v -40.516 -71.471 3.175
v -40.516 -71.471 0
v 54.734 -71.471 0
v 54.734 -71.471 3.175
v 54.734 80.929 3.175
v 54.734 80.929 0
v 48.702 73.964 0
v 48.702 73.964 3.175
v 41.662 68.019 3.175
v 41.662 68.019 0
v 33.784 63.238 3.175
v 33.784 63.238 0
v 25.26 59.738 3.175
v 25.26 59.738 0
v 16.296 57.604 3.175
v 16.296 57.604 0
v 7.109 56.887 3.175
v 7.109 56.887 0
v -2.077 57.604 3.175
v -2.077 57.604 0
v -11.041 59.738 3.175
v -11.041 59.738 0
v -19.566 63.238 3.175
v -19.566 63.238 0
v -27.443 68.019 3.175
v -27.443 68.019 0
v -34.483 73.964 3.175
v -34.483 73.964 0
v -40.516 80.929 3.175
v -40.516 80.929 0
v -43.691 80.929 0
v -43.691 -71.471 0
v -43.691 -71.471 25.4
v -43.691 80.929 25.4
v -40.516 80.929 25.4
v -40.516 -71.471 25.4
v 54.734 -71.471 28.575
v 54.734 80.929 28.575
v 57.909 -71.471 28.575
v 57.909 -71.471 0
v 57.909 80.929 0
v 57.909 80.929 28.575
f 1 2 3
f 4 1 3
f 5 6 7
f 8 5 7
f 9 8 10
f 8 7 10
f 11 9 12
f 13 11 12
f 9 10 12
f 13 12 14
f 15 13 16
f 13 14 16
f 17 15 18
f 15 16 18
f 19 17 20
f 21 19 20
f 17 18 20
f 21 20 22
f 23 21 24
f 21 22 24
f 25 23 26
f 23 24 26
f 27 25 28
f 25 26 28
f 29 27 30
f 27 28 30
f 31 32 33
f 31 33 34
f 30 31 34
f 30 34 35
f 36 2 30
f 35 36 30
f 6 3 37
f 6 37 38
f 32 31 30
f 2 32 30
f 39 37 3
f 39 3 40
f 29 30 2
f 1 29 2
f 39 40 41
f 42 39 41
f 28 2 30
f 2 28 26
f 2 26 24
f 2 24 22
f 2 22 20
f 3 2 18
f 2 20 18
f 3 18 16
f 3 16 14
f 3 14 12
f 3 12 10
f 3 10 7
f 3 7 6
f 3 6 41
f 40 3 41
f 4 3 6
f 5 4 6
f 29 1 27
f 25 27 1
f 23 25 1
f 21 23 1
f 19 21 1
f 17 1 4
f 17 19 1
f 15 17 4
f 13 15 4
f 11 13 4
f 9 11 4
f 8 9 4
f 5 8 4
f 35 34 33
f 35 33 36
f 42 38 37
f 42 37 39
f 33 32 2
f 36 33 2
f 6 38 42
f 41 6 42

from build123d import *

# Parameters (mm, degrees)
F1_DEPTH = 3.175
F2_W     = 3.175
F2_H     = 152.4
F3_DEPTH = 28.575
F4_DEPTH = 25.4


with BuildPart() as f1:
    # F0 (on Top) → F1 (new body)
    with BuildSketch(Plane.XY):
        with BuildLine():
            Line((-40.515711, -68.295603), (-40.515711, -71.470603))
            Line((-40.515711, -71.470603), (54.734289, -71.470603))
            Line((54.734289, -71.470603), (54.734289, -63.526561))
            Line((54.734289, -63.526561), (54.734289, 80.929397))
            ThreePointArc((54.734289, 80.929397), (7.109289, 56.886774), (-40.515711, 80.929397))
            Line((-40.515711, 80.929397), (-40.515711, -68.295603))
        make_face()
    extrude(amount=F1_DEPTH)


with BuildPart() as f3:
    # F2 (on Top) → F3 (new body)
    with BuildSketch(Plane.XY):
        with Locations((56.321752, 4.729441)):
            Rectangle(F2_W, F2_H)
    extrude(amount=F3_DEPTH)


with BuildPart() as f4:
    # F2 (on Top) → F4 (new body)
    with BuildSketch(Plane.XY):
        with Locations((-42.103079, 4.729434)):
            Rectangle(F2_W, F2_H)
    extrude(amount=F4_DEPTH)


solid = Compound([f1.part, f3.part, f4.part])
